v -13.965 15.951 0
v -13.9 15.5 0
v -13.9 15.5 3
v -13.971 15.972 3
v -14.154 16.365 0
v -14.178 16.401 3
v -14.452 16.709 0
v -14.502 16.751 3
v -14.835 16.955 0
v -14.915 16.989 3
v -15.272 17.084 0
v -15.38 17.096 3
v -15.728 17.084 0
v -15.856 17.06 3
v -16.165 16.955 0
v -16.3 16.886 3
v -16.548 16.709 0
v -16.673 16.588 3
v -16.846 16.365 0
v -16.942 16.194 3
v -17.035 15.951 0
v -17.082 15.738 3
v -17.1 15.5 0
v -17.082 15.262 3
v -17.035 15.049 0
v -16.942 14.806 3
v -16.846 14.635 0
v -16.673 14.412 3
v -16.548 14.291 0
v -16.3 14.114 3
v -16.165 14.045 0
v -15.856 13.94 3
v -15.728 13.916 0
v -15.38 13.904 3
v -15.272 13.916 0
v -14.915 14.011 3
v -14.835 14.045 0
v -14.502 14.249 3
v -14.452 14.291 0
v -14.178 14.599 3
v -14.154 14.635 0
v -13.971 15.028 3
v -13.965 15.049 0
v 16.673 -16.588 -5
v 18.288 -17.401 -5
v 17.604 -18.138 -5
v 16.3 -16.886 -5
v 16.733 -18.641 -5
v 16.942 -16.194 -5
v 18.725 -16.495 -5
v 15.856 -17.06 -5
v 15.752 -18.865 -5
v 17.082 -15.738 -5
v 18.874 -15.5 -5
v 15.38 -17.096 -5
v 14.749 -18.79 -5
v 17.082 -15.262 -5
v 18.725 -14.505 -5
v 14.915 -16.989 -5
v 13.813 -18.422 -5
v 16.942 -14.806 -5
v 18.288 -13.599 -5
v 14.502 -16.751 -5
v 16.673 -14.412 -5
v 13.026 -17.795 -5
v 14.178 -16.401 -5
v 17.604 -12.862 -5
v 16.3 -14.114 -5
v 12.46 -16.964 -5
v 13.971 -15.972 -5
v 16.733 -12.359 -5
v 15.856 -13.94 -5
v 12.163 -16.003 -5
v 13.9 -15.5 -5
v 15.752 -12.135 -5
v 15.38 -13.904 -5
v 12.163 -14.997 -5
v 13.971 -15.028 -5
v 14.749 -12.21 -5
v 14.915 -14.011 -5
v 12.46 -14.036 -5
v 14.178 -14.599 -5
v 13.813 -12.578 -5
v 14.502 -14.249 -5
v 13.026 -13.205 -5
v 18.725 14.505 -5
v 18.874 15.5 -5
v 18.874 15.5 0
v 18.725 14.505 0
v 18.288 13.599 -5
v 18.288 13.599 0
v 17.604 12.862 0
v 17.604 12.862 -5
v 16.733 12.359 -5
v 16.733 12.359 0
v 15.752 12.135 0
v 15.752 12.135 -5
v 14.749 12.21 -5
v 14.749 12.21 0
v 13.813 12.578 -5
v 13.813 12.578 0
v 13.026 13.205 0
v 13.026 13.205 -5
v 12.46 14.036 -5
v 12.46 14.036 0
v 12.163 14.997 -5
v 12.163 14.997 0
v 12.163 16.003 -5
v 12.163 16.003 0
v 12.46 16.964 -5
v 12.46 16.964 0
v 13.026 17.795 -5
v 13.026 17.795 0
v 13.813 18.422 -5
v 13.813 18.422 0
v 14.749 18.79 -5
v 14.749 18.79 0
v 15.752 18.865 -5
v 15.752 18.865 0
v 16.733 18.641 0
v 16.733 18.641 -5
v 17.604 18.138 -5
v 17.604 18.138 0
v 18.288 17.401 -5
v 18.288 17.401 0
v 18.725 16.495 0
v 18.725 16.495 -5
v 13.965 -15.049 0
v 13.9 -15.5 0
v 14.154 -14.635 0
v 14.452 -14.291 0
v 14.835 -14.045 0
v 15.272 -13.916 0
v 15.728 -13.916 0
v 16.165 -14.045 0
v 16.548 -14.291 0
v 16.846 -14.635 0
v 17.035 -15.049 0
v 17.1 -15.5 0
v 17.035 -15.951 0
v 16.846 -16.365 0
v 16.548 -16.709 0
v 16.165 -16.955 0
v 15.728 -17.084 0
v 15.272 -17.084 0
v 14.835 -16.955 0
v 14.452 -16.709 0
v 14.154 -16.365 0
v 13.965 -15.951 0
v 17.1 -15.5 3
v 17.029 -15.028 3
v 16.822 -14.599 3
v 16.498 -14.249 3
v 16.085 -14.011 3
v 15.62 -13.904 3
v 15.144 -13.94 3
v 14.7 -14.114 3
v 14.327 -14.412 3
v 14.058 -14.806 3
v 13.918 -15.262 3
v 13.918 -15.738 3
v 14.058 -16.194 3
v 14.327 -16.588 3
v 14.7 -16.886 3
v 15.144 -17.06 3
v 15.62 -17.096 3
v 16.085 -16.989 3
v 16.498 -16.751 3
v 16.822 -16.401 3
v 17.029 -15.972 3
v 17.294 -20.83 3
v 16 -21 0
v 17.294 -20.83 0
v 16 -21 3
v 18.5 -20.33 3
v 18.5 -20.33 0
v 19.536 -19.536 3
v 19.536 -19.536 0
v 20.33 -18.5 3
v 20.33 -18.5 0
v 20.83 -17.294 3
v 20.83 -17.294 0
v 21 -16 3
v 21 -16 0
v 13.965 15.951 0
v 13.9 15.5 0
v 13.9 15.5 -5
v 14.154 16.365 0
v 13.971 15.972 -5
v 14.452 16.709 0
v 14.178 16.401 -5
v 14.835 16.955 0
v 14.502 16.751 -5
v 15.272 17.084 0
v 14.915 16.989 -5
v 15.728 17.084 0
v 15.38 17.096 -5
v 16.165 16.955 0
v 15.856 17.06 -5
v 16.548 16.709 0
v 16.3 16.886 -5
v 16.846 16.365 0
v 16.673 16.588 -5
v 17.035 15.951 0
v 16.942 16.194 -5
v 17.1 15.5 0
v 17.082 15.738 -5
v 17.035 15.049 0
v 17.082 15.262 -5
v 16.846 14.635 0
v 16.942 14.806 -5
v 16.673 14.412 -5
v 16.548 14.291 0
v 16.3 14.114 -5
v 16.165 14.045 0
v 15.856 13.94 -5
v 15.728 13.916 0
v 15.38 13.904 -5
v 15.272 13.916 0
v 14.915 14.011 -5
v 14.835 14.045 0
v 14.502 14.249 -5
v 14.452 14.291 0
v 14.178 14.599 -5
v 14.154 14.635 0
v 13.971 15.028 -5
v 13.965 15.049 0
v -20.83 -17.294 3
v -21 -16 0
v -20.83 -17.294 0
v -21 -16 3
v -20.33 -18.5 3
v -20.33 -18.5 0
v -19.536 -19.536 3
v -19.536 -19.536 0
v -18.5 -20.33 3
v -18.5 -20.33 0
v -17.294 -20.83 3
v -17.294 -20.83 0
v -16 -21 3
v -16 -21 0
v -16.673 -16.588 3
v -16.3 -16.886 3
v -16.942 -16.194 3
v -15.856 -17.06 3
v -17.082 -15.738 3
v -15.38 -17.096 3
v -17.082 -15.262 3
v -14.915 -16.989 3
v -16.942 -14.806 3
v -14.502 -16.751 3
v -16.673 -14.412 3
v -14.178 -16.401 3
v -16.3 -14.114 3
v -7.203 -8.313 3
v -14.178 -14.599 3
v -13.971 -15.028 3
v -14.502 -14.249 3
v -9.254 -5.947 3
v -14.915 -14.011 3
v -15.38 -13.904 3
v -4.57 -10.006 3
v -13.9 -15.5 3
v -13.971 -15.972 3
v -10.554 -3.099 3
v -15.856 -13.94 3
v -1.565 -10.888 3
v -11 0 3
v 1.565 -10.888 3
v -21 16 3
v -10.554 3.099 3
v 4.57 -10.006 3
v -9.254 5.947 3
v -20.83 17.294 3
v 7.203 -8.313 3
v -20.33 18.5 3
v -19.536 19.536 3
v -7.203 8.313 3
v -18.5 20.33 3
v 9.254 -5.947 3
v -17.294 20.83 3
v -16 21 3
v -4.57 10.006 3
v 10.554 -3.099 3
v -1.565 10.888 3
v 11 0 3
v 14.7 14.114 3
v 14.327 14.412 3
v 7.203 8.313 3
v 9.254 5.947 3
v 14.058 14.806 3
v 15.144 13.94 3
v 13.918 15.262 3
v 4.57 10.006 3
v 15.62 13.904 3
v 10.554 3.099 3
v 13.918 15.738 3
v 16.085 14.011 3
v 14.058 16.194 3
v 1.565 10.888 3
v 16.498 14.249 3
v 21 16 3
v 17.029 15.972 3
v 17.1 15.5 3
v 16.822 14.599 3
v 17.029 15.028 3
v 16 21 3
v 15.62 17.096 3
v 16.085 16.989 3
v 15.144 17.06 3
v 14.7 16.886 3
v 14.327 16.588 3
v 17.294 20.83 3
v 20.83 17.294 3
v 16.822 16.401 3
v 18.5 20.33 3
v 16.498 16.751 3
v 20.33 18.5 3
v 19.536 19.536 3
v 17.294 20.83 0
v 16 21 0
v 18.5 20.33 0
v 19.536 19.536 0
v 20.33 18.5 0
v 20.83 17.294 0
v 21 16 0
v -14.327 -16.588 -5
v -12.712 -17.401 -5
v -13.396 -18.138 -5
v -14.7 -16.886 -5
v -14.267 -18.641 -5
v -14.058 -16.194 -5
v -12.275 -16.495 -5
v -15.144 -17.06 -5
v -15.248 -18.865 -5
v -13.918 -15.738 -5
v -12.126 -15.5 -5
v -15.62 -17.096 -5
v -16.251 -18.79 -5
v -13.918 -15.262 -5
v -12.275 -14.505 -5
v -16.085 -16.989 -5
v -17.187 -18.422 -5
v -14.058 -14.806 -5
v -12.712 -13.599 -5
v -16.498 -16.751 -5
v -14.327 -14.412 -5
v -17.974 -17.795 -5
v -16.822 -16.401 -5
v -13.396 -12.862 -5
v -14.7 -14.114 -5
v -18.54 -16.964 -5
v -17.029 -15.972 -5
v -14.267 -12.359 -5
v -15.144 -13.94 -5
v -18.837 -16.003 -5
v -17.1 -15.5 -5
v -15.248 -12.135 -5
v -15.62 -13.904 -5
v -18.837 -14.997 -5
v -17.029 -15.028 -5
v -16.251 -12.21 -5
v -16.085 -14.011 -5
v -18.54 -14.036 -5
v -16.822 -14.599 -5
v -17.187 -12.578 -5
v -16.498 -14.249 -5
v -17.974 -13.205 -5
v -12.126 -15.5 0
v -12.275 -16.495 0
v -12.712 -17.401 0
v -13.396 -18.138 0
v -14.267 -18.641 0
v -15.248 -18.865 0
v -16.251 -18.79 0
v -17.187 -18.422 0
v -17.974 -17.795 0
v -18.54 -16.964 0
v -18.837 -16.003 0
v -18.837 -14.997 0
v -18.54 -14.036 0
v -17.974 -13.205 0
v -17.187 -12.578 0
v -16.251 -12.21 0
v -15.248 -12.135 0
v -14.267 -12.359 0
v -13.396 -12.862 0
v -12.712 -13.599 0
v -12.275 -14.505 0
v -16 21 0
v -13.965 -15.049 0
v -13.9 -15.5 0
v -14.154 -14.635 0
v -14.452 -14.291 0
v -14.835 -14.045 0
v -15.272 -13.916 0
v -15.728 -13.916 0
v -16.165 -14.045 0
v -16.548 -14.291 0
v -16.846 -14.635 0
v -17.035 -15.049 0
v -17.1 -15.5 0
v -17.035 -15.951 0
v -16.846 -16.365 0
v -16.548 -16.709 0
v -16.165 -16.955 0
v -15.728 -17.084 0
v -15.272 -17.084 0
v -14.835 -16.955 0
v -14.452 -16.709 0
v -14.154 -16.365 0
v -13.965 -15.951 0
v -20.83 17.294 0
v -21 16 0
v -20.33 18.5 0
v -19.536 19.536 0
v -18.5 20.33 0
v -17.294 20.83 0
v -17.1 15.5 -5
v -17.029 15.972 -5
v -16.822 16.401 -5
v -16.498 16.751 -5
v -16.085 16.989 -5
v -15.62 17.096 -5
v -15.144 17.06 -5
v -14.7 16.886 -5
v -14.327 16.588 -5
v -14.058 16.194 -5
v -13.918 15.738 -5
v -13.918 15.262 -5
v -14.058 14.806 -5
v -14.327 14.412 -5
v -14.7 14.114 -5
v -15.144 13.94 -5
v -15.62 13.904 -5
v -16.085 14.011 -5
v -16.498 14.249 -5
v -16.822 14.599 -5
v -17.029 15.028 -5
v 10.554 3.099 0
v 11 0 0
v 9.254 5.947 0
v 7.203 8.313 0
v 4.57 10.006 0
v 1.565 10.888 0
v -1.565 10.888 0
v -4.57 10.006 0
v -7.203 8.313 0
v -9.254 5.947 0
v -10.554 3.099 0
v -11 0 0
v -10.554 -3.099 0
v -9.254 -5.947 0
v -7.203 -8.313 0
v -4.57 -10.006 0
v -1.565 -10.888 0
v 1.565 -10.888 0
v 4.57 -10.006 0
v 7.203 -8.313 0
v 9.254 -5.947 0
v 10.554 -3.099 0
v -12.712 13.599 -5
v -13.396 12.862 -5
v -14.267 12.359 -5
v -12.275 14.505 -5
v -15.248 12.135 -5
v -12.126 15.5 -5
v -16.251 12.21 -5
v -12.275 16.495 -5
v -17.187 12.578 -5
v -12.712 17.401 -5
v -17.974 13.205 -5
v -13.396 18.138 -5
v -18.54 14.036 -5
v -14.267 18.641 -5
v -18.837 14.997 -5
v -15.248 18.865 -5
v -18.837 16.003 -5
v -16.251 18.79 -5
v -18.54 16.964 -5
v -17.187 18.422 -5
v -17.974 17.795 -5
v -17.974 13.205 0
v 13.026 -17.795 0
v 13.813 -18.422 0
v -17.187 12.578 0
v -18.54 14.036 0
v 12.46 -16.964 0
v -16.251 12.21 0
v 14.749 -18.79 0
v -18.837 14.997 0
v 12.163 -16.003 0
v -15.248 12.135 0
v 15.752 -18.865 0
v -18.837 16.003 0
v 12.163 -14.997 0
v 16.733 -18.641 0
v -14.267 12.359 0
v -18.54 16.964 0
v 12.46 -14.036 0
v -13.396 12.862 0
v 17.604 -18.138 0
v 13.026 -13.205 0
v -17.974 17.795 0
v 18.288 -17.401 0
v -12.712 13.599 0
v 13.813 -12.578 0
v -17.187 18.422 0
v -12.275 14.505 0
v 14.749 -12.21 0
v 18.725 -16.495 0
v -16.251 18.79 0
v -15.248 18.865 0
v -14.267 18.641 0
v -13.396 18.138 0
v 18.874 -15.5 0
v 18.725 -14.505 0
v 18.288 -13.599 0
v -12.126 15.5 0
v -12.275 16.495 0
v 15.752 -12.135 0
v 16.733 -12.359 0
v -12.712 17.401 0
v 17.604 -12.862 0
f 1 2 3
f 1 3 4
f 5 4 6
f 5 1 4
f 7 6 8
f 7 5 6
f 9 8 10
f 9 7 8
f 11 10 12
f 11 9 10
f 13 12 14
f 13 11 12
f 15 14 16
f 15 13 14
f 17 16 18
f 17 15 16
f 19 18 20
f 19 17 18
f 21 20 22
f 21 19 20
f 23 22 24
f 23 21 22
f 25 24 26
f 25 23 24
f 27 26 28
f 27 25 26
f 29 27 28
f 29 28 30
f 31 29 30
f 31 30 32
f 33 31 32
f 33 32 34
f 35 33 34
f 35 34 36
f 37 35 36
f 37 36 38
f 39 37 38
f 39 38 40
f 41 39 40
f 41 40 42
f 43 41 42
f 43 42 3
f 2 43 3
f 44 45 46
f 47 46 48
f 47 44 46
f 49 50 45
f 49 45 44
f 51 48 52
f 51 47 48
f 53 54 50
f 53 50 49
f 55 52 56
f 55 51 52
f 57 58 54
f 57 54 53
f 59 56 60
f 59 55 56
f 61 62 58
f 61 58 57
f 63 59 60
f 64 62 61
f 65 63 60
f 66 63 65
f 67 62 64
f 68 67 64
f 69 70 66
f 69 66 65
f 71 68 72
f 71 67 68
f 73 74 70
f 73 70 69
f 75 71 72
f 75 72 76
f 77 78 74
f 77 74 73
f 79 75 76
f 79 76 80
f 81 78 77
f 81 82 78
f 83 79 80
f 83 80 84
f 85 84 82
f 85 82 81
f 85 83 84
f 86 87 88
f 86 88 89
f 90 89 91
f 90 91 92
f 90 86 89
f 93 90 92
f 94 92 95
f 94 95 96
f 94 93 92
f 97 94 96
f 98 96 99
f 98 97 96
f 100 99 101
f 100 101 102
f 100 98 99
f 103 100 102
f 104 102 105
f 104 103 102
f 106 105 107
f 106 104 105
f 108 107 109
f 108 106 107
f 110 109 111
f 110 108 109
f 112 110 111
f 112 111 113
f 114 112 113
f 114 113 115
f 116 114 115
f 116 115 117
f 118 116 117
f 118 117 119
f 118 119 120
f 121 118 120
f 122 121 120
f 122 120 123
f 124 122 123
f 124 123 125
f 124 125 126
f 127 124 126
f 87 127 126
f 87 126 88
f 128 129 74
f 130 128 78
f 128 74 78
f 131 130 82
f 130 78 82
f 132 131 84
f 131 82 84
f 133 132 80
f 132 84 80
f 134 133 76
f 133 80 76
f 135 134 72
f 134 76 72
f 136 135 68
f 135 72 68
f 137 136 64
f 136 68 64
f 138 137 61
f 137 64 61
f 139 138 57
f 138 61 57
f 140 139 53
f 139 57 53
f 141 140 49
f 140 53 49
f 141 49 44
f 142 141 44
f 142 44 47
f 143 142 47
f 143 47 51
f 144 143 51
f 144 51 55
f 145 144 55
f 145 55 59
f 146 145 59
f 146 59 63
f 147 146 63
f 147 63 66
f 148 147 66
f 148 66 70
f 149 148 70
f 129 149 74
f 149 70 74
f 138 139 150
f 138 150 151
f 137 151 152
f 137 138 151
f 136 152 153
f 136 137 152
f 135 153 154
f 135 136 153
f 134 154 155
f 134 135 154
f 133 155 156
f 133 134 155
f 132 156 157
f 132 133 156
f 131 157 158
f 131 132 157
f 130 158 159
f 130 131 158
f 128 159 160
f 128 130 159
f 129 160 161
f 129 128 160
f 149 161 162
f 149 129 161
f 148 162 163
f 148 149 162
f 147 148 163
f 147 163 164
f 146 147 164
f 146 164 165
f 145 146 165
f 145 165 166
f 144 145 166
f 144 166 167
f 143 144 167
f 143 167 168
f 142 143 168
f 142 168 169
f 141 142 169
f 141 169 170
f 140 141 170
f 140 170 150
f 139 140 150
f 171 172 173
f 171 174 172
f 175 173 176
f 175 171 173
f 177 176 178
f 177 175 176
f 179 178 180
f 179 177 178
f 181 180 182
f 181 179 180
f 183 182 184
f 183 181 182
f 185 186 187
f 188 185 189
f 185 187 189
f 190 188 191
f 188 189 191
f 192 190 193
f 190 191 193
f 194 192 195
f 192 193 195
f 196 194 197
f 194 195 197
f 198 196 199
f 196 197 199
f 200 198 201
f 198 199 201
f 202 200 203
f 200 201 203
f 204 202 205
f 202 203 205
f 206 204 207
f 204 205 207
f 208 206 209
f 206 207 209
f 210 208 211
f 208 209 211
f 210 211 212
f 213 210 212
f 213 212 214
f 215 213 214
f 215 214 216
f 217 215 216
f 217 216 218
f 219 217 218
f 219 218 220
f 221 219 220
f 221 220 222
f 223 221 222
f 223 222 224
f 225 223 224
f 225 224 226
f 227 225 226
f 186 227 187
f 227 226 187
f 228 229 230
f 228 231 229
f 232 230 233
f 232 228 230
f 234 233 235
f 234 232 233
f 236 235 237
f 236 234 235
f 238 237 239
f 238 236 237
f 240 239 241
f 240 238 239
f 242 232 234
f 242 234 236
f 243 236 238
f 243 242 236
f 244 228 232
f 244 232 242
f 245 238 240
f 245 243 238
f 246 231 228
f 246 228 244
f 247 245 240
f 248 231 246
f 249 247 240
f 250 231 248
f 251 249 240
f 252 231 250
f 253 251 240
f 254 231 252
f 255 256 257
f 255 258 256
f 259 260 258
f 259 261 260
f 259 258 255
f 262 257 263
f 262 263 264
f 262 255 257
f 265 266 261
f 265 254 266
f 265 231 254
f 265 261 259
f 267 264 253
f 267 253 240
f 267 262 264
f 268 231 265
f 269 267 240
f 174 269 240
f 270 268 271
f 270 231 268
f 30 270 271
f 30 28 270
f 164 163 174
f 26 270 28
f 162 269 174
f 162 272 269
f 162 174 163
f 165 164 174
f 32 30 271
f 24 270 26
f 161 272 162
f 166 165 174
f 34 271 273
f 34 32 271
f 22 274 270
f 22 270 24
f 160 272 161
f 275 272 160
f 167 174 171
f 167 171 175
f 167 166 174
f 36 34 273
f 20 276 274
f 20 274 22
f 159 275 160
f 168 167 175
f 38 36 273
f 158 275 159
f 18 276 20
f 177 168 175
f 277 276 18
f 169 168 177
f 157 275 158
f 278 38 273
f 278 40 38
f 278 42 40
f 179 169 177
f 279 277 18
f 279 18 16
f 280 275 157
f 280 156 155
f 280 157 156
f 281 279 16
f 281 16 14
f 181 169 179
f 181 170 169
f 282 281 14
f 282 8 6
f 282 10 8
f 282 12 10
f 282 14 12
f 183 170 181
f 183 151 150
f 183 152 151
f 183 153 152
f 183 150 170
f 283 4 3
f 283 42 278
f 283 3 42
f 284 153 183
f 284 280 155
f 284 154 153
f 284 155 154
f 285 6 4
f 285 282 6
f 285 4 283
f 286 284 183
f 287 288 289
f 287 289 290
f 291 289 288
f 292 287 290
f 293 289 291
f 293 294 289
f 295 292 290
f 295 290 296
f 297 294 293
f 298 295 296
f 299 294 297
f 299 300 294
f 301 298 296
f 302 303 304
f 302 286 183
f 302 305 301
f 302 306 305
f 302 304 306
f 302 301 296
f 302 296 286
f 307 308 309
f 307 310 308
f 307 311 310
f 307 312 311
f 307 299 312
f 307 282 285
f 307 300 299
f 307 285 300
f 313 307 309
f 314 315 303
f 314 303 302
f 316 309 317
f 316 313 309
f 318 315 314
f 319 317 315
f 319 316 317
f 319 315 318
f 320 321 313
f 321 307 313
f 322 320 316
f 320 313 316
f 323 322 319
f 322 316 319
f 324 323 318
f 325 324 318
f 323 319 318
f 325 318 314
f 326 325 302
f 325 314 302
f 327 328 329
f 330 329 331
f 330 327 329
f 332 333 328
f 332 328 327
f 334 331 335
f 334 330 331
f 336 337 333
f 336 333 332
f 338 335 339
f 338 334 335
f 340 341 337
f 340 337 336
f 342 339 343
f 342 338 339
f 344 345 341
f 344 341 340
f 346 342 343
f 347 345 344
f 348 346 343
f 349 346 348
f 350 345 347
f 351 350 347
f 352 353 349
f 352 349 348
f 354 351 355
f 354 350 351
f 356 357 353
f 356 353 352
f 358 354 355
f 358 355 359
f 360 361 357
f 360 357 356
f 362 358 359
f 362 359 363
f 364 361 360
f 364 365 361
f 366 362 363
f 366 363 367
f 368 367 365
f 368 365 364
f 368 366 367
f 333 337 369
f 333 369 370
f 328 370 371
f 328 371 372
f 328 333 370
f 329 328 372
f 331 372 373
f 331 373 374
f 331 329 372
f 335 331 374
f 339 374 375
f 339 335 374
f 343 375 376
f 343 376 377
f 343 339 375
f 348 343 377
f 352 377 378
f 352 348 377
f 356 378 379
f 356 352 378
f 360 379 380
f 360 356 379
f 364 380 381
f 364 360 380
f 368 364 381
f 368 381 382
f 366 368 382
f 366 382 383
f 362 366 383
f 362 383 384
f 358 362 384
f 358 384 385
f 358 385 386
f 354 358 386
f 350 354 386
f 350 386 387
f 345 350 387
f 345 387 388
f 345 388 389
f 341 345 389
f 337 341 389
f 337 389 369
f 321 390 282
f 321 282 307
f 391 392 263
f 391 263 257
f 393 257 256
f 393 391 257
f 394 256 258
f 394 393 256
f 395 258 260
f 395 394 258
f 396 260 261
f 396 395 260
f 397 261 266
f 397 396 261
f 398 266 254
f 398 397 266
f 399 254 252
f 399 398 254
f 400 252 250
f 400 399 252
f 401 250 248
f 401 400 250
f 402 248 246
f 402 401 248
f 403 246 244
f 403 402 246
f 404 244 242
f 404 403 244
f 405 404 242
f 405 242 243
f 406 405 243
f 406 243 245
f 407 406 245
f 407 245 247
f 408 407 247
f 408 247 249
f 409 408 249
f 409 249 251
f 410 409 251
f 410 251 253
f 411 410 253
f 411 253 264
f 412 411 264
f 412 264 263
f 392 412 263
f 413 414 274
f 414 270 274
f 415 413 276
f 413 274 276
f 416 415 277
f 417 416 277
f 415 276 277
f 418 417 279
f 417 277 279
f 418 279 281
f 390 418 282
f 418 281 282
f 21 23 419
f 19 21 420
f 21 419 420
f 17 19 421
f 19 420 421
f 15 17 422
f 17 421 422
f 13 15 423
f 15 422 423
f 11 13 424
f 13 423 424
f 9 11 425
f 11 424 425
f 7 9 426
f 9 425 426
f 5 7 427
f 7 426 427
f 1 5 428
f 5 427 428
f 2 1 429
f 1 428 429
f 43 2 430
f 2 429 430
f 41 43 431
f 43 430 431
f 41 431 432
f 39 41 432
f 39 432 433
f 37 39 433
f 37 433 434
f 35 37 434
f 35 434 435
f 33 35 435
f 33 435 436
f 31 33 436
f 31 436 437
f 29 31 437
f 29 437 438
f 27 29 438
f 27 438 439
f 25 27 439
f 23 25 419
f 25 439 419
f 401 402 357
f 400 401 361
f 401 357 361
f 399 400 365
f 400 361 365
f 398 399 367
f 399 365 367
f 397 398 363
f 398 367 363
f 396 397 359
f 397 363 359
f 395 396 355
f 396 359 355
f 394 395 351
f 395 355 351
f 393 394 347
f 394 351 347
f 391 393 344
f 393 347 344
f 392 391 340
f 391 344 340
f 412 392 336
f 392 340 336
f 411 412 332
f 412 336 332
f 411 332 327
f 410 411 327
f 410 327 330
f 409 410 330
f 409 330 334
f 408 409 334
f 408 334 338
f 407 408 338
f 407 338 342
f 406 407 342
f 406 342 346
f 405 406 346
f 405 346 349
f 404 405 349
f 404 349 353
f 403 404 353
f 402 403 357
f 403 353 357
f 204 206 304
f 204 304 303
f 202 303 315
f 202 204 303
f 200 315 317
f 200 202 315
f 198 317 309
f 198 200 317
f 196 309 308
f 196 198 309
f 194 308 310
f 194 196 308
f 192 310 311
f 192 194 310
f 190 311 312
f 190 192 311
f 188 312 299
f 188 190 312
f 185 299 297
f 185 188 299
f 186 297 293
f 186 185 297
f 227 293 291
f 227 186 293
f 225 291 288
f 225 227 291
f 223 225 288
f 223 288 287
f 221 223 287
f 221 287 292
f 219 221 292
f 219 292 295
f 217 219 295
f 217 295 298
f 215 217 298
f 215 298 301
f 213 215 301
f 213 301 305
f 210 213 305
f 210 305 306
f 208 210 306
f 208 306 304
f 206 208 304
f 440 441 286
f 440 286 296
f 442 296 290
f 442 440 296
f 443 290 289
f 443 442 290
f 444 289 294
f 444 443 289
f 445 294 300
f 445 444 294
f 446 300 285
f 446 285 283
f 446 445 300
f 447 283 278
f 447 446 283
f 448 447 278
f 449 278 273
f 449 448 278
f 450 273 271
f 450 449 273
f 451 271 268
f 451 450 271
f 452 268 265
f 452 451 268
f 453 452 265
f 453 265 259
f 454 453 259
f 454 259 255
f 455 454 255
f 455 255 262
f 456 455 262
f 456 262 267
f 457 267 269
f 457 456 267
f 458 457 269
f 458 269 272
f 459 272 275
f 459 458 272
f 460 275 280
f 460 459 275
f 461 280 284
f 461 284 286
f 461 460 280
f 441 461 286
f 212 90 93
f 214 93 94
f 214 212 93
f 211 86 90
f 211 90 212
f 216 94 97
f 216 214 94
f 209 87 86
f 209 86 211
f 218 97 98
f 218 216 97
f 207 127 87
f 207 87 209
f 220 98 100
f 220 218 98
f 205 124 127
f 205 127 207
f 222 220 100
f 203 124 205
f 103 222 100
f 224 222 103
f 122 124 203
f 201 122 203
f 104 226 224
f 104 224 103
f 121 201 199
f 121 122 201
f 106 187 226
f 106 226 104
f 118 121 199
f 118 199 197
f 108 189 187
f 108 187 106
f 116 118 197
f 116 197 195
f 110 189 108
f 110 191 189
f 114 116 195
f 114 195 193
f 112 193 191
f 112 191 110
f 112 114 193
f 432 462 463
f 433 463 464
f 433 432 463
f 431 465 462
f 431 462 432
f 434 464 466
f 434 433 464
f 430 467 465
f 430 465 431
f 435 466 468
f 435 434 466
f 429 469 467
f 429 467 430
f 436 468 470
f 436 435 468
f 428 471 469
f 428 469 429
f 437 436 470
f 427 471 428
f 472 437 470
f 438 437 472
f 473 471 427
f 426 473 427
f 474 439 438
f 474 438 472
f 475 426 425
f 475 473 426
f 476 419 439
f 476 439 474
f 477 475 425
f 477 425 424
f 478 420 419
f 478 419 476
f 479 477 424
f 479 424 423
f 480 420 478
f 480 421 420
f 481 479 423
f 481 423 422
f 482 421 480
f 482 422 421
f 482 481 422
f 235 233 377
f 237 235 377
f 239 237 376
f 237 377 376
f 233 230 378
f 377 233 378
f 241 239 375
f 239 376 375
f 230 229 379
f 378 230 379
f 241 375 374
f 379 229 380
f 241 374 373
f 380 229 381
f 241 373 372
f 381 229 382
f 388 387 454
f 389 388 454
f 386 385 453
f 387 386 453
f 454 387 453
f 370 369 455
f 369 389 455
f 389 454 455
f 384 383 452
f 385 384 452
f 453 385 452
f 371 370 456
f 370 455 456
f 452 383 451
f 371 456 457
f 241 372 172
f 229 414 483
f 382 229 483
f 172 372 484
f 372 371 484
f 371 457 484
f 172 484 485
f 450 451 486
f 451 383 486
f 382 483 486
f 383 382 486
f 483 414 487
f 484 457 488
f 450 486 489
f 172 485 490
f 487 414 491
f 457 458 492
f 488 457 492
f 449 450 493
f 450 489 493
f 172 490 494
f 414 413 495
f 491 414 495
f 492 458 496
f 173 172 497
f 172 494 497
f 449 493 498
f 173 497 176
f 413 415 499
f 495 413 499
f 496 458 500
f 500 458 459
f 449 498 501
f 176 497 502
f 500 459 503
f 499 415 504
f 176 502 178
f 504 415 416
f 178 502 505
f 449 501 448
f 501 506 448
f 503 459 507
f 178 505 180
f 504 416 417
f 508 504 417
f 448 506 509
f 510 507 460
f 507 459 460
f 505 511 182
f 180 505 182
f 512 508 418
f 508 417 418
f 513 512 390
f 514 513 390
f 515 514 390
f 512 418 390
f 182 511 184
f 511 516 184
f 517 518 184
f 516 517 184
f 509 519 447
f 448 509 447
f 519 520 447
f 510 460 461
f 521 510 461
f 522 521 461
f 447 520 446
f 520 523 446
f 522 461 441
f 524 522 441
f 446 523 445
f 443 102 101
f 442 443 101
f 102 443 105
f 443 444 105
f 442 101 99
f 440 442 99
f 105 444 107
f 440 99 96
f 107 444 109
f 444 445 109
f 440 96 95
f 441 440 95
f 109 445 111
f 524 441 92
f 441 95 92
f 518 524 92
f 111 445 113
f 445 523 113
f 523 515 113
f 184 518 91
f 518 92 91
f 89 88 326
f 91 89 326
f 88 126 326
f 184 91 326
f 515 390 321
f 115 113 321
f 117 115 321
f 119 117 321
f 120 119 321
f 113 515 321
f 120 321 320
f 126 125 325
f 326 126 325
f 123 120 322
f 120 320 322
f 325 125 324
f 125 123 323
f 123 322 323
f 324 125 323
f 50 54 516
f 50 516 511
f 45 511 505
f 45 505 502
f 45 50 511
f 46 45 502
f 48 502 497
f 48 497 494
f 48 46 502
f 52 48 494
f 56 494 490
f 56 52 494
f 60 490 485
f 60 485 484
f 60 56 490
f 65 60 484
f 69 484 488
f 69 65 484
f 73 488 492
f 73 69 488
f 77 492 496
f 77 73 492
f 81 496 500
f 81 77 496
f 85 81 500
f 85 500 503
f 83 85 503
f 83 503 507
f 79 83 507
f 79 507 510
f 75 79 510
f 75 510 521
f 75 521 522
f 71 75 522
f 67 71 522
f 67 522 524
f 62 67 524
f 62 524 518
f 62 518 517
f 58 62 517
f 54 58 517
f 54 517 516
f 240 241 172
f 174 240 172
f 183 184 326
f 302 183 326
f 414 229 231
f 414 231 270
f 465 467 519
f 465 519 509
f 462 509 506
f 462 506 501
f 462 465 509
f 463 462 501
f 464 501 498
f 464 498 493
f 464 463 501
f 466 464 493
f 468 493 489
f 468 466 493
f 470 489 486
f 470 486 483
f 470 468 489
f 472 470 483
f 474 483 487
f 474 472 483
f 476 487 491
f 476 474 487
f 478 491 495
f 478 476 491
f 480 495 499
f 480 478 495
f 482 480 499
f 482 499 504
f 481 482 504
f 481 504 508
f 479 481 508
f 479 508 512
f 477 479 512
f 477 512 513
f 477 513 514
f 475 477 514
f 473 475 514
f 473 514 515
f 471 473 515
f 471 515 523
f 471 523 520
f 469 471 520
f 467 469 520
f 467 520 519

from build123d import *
from build123d.topology import SkipClean

# Parameters (mm, degrees)
SKETCH_1_W          = 42
SKETCH_1_H          = 42
SKETCH_1_R          = 1.6
SKETCH_1_R_2        = 11
EXTRUDE_1_DEPTH     = 3
FILLET_1_R          = 5
SKETCH_2_R          = 18
SKETCH_2_R_2        = 16
EXTRUDE_2_DEPTH     = 7
SKETCH_3_R          = 18
CUT_EXTRUDE_1_DEPTH = 31.512292605
EXTRUDE_START       = 10
SKETCH_5_R          = 3.3744514
SKETCH_5_R_2        = 1.6
EXTRUDE_3_DEPTH     = 10
SKETCH_6_R          = 29.988596493
CUT_EXTRUDE_2_DEPTH = 5


with BuildPart() as part:
    # 草图1 → 凸台-拉伸1 (new body)
    with BuildSketch(Plane.XY):
        Rectangle(SKETCH_1_W, SKETCH_1_H)
        with Locations((-15.5, 15.5)):
            Circle(SKETCH_1_R, mode=Mode.SUBTRACT)
        with Locations((15.5, 15.5)):
            Circle(SKETCH_1_R, mode=Mode.SUBTRACT)
        with Locations((15.5, -15.5)):
            Circle(SKETCH_1_R, mode=Mode.SUBTRACT)
        with Locations((-15.5, -15.5)):
            Circle(SKETCH_1_R, mode=Mode.SUBTRACT)
        Circle(SKETCH_1_R_2, mode=Mode.SUBTRACT)
    extrude(amount=EXTRUDE_1_DEPTH)

    # 圆角1
    fillet_1_edges = [part.edges().sort_by_distance(p)[0] for p in [
        (-21, -21, 1.5),
        (-21, 21, 1.5),
        (21, 21, 1.5),
        (21, -21, 1.5),
    ]]
    fillet(fillet_1_edges, radius=FILLET_1_R)

    # 草图2 → 凸台-拉伸2 (add)
    with BuildSketch(Plane(origin=(0, 0, 0), x_dir=(-1, 0, 0), z_dir=(0, 0, -1))):
        with Locations(Location((0, 0, 0), (0, 0, 180))):
            Circle(SKETCH_2_R)
        Circle(SKETCH_2_R_2, mode=Mode.SUBTRACT)
    extrude(amount=EXTRUDE_2_DEPTH)

    # 草图3 → 切除-拉伸1 (cut, through all)
    with BuildSketch(Plane(origin=(0, 0, 0), x_dir=(-1, 0, 0), z_dir=(0, 0, -1))):
        Circle(SKETCH_3_R)
    extrude(amount=CUT_EXTRUDE_1_DEPTH, mode=Mode.SUBTRACT)

    # 草图5 → 凸台-拉伸3 (add)
    # profile 1 of 4: a face of its own
    with SkipClean():  # the faces are left unmerged after this step: merging them gives an invalid solid
        with BuildSketch(Plane(origin=(0, 0, 0), x_dir=(-1, 0, 0), z_dir=(0, 0, -1)).offset(EXTRUDE_START)):
            with Locations(Location((-15.5, 15.5, 0), (0, 0, 180))):
                Circle(SKETCH_5_R)
            with Locations((-15.5, 15.5)):
                Circle(SKETCH_5_R_2, mode=Mode.SUBTRACT)
        # profile 2 of 4: a face of its own
        with BuildSketch(Plane(origin=(0, 0, 0), x_dir=(-1, 0, 0), z_dir=(0, 0, -1)).offset(EXTRUDE_START)):
            with Locations(Location((15.5, 15.5, 0), (0, 0, 180))):
                Circle(SKETCH_5_R)
            with Locations((15.5, 15.5)):
                Circle(SKETCH_5_R_2, mode=Mode.SUBTRACT)
        # profile 3 of 4: a face of its own
        with BuildSketch(Plane(origin=(0, 0, 0), x_dir=(-1, 0, 0), z_dir=(0, 0, -1)).offset(EXTRUDE_START)):
            with Locations(Location((15.5, -15.5, 0), (0, 0, 180))):
                Circle(SKETCH_5_R)
            with Locations((15.5, -15.5)):
                Circle(SKETCH_5_R_2, mode=Mode.SUBTRACT)
        # profile 4 of 4: a face of its own
        with BuildSketch(Plane(origin=(0, 0, 0), x_dir=(-1, 0, 0), z_dir=(0, 0, -1)).offset(EXTRUDE_START)):
            with Locations(Location((-15.5, -15.5, 0), (0, 0, 180))):
                Circle(SKETCH_5_R)
            with Locations((-15.5, -15.5)):
                Circle(SKETCH_5_R_2, mode=Mode.SUBTRACT)
        extrude(amount=-EXTRUDE_3_DEPTH)

    # 草图6 → 切除-拉伸2 (cut)
    with SkipClean():  # the faces are left unmerged after this step: merging them gives an invalid solid
        with BuildSketch(Plane(origin=(0, 0, -10), x_dir=(-1, 0, 0), z_dir=(0, 0, -1))):
            Circle(SKETCH_6_R)
        extrude(amount=-CUT_EXTRUDE_2_DEPTH, mode=Mode.SUBTRACT)


solid = part.part
